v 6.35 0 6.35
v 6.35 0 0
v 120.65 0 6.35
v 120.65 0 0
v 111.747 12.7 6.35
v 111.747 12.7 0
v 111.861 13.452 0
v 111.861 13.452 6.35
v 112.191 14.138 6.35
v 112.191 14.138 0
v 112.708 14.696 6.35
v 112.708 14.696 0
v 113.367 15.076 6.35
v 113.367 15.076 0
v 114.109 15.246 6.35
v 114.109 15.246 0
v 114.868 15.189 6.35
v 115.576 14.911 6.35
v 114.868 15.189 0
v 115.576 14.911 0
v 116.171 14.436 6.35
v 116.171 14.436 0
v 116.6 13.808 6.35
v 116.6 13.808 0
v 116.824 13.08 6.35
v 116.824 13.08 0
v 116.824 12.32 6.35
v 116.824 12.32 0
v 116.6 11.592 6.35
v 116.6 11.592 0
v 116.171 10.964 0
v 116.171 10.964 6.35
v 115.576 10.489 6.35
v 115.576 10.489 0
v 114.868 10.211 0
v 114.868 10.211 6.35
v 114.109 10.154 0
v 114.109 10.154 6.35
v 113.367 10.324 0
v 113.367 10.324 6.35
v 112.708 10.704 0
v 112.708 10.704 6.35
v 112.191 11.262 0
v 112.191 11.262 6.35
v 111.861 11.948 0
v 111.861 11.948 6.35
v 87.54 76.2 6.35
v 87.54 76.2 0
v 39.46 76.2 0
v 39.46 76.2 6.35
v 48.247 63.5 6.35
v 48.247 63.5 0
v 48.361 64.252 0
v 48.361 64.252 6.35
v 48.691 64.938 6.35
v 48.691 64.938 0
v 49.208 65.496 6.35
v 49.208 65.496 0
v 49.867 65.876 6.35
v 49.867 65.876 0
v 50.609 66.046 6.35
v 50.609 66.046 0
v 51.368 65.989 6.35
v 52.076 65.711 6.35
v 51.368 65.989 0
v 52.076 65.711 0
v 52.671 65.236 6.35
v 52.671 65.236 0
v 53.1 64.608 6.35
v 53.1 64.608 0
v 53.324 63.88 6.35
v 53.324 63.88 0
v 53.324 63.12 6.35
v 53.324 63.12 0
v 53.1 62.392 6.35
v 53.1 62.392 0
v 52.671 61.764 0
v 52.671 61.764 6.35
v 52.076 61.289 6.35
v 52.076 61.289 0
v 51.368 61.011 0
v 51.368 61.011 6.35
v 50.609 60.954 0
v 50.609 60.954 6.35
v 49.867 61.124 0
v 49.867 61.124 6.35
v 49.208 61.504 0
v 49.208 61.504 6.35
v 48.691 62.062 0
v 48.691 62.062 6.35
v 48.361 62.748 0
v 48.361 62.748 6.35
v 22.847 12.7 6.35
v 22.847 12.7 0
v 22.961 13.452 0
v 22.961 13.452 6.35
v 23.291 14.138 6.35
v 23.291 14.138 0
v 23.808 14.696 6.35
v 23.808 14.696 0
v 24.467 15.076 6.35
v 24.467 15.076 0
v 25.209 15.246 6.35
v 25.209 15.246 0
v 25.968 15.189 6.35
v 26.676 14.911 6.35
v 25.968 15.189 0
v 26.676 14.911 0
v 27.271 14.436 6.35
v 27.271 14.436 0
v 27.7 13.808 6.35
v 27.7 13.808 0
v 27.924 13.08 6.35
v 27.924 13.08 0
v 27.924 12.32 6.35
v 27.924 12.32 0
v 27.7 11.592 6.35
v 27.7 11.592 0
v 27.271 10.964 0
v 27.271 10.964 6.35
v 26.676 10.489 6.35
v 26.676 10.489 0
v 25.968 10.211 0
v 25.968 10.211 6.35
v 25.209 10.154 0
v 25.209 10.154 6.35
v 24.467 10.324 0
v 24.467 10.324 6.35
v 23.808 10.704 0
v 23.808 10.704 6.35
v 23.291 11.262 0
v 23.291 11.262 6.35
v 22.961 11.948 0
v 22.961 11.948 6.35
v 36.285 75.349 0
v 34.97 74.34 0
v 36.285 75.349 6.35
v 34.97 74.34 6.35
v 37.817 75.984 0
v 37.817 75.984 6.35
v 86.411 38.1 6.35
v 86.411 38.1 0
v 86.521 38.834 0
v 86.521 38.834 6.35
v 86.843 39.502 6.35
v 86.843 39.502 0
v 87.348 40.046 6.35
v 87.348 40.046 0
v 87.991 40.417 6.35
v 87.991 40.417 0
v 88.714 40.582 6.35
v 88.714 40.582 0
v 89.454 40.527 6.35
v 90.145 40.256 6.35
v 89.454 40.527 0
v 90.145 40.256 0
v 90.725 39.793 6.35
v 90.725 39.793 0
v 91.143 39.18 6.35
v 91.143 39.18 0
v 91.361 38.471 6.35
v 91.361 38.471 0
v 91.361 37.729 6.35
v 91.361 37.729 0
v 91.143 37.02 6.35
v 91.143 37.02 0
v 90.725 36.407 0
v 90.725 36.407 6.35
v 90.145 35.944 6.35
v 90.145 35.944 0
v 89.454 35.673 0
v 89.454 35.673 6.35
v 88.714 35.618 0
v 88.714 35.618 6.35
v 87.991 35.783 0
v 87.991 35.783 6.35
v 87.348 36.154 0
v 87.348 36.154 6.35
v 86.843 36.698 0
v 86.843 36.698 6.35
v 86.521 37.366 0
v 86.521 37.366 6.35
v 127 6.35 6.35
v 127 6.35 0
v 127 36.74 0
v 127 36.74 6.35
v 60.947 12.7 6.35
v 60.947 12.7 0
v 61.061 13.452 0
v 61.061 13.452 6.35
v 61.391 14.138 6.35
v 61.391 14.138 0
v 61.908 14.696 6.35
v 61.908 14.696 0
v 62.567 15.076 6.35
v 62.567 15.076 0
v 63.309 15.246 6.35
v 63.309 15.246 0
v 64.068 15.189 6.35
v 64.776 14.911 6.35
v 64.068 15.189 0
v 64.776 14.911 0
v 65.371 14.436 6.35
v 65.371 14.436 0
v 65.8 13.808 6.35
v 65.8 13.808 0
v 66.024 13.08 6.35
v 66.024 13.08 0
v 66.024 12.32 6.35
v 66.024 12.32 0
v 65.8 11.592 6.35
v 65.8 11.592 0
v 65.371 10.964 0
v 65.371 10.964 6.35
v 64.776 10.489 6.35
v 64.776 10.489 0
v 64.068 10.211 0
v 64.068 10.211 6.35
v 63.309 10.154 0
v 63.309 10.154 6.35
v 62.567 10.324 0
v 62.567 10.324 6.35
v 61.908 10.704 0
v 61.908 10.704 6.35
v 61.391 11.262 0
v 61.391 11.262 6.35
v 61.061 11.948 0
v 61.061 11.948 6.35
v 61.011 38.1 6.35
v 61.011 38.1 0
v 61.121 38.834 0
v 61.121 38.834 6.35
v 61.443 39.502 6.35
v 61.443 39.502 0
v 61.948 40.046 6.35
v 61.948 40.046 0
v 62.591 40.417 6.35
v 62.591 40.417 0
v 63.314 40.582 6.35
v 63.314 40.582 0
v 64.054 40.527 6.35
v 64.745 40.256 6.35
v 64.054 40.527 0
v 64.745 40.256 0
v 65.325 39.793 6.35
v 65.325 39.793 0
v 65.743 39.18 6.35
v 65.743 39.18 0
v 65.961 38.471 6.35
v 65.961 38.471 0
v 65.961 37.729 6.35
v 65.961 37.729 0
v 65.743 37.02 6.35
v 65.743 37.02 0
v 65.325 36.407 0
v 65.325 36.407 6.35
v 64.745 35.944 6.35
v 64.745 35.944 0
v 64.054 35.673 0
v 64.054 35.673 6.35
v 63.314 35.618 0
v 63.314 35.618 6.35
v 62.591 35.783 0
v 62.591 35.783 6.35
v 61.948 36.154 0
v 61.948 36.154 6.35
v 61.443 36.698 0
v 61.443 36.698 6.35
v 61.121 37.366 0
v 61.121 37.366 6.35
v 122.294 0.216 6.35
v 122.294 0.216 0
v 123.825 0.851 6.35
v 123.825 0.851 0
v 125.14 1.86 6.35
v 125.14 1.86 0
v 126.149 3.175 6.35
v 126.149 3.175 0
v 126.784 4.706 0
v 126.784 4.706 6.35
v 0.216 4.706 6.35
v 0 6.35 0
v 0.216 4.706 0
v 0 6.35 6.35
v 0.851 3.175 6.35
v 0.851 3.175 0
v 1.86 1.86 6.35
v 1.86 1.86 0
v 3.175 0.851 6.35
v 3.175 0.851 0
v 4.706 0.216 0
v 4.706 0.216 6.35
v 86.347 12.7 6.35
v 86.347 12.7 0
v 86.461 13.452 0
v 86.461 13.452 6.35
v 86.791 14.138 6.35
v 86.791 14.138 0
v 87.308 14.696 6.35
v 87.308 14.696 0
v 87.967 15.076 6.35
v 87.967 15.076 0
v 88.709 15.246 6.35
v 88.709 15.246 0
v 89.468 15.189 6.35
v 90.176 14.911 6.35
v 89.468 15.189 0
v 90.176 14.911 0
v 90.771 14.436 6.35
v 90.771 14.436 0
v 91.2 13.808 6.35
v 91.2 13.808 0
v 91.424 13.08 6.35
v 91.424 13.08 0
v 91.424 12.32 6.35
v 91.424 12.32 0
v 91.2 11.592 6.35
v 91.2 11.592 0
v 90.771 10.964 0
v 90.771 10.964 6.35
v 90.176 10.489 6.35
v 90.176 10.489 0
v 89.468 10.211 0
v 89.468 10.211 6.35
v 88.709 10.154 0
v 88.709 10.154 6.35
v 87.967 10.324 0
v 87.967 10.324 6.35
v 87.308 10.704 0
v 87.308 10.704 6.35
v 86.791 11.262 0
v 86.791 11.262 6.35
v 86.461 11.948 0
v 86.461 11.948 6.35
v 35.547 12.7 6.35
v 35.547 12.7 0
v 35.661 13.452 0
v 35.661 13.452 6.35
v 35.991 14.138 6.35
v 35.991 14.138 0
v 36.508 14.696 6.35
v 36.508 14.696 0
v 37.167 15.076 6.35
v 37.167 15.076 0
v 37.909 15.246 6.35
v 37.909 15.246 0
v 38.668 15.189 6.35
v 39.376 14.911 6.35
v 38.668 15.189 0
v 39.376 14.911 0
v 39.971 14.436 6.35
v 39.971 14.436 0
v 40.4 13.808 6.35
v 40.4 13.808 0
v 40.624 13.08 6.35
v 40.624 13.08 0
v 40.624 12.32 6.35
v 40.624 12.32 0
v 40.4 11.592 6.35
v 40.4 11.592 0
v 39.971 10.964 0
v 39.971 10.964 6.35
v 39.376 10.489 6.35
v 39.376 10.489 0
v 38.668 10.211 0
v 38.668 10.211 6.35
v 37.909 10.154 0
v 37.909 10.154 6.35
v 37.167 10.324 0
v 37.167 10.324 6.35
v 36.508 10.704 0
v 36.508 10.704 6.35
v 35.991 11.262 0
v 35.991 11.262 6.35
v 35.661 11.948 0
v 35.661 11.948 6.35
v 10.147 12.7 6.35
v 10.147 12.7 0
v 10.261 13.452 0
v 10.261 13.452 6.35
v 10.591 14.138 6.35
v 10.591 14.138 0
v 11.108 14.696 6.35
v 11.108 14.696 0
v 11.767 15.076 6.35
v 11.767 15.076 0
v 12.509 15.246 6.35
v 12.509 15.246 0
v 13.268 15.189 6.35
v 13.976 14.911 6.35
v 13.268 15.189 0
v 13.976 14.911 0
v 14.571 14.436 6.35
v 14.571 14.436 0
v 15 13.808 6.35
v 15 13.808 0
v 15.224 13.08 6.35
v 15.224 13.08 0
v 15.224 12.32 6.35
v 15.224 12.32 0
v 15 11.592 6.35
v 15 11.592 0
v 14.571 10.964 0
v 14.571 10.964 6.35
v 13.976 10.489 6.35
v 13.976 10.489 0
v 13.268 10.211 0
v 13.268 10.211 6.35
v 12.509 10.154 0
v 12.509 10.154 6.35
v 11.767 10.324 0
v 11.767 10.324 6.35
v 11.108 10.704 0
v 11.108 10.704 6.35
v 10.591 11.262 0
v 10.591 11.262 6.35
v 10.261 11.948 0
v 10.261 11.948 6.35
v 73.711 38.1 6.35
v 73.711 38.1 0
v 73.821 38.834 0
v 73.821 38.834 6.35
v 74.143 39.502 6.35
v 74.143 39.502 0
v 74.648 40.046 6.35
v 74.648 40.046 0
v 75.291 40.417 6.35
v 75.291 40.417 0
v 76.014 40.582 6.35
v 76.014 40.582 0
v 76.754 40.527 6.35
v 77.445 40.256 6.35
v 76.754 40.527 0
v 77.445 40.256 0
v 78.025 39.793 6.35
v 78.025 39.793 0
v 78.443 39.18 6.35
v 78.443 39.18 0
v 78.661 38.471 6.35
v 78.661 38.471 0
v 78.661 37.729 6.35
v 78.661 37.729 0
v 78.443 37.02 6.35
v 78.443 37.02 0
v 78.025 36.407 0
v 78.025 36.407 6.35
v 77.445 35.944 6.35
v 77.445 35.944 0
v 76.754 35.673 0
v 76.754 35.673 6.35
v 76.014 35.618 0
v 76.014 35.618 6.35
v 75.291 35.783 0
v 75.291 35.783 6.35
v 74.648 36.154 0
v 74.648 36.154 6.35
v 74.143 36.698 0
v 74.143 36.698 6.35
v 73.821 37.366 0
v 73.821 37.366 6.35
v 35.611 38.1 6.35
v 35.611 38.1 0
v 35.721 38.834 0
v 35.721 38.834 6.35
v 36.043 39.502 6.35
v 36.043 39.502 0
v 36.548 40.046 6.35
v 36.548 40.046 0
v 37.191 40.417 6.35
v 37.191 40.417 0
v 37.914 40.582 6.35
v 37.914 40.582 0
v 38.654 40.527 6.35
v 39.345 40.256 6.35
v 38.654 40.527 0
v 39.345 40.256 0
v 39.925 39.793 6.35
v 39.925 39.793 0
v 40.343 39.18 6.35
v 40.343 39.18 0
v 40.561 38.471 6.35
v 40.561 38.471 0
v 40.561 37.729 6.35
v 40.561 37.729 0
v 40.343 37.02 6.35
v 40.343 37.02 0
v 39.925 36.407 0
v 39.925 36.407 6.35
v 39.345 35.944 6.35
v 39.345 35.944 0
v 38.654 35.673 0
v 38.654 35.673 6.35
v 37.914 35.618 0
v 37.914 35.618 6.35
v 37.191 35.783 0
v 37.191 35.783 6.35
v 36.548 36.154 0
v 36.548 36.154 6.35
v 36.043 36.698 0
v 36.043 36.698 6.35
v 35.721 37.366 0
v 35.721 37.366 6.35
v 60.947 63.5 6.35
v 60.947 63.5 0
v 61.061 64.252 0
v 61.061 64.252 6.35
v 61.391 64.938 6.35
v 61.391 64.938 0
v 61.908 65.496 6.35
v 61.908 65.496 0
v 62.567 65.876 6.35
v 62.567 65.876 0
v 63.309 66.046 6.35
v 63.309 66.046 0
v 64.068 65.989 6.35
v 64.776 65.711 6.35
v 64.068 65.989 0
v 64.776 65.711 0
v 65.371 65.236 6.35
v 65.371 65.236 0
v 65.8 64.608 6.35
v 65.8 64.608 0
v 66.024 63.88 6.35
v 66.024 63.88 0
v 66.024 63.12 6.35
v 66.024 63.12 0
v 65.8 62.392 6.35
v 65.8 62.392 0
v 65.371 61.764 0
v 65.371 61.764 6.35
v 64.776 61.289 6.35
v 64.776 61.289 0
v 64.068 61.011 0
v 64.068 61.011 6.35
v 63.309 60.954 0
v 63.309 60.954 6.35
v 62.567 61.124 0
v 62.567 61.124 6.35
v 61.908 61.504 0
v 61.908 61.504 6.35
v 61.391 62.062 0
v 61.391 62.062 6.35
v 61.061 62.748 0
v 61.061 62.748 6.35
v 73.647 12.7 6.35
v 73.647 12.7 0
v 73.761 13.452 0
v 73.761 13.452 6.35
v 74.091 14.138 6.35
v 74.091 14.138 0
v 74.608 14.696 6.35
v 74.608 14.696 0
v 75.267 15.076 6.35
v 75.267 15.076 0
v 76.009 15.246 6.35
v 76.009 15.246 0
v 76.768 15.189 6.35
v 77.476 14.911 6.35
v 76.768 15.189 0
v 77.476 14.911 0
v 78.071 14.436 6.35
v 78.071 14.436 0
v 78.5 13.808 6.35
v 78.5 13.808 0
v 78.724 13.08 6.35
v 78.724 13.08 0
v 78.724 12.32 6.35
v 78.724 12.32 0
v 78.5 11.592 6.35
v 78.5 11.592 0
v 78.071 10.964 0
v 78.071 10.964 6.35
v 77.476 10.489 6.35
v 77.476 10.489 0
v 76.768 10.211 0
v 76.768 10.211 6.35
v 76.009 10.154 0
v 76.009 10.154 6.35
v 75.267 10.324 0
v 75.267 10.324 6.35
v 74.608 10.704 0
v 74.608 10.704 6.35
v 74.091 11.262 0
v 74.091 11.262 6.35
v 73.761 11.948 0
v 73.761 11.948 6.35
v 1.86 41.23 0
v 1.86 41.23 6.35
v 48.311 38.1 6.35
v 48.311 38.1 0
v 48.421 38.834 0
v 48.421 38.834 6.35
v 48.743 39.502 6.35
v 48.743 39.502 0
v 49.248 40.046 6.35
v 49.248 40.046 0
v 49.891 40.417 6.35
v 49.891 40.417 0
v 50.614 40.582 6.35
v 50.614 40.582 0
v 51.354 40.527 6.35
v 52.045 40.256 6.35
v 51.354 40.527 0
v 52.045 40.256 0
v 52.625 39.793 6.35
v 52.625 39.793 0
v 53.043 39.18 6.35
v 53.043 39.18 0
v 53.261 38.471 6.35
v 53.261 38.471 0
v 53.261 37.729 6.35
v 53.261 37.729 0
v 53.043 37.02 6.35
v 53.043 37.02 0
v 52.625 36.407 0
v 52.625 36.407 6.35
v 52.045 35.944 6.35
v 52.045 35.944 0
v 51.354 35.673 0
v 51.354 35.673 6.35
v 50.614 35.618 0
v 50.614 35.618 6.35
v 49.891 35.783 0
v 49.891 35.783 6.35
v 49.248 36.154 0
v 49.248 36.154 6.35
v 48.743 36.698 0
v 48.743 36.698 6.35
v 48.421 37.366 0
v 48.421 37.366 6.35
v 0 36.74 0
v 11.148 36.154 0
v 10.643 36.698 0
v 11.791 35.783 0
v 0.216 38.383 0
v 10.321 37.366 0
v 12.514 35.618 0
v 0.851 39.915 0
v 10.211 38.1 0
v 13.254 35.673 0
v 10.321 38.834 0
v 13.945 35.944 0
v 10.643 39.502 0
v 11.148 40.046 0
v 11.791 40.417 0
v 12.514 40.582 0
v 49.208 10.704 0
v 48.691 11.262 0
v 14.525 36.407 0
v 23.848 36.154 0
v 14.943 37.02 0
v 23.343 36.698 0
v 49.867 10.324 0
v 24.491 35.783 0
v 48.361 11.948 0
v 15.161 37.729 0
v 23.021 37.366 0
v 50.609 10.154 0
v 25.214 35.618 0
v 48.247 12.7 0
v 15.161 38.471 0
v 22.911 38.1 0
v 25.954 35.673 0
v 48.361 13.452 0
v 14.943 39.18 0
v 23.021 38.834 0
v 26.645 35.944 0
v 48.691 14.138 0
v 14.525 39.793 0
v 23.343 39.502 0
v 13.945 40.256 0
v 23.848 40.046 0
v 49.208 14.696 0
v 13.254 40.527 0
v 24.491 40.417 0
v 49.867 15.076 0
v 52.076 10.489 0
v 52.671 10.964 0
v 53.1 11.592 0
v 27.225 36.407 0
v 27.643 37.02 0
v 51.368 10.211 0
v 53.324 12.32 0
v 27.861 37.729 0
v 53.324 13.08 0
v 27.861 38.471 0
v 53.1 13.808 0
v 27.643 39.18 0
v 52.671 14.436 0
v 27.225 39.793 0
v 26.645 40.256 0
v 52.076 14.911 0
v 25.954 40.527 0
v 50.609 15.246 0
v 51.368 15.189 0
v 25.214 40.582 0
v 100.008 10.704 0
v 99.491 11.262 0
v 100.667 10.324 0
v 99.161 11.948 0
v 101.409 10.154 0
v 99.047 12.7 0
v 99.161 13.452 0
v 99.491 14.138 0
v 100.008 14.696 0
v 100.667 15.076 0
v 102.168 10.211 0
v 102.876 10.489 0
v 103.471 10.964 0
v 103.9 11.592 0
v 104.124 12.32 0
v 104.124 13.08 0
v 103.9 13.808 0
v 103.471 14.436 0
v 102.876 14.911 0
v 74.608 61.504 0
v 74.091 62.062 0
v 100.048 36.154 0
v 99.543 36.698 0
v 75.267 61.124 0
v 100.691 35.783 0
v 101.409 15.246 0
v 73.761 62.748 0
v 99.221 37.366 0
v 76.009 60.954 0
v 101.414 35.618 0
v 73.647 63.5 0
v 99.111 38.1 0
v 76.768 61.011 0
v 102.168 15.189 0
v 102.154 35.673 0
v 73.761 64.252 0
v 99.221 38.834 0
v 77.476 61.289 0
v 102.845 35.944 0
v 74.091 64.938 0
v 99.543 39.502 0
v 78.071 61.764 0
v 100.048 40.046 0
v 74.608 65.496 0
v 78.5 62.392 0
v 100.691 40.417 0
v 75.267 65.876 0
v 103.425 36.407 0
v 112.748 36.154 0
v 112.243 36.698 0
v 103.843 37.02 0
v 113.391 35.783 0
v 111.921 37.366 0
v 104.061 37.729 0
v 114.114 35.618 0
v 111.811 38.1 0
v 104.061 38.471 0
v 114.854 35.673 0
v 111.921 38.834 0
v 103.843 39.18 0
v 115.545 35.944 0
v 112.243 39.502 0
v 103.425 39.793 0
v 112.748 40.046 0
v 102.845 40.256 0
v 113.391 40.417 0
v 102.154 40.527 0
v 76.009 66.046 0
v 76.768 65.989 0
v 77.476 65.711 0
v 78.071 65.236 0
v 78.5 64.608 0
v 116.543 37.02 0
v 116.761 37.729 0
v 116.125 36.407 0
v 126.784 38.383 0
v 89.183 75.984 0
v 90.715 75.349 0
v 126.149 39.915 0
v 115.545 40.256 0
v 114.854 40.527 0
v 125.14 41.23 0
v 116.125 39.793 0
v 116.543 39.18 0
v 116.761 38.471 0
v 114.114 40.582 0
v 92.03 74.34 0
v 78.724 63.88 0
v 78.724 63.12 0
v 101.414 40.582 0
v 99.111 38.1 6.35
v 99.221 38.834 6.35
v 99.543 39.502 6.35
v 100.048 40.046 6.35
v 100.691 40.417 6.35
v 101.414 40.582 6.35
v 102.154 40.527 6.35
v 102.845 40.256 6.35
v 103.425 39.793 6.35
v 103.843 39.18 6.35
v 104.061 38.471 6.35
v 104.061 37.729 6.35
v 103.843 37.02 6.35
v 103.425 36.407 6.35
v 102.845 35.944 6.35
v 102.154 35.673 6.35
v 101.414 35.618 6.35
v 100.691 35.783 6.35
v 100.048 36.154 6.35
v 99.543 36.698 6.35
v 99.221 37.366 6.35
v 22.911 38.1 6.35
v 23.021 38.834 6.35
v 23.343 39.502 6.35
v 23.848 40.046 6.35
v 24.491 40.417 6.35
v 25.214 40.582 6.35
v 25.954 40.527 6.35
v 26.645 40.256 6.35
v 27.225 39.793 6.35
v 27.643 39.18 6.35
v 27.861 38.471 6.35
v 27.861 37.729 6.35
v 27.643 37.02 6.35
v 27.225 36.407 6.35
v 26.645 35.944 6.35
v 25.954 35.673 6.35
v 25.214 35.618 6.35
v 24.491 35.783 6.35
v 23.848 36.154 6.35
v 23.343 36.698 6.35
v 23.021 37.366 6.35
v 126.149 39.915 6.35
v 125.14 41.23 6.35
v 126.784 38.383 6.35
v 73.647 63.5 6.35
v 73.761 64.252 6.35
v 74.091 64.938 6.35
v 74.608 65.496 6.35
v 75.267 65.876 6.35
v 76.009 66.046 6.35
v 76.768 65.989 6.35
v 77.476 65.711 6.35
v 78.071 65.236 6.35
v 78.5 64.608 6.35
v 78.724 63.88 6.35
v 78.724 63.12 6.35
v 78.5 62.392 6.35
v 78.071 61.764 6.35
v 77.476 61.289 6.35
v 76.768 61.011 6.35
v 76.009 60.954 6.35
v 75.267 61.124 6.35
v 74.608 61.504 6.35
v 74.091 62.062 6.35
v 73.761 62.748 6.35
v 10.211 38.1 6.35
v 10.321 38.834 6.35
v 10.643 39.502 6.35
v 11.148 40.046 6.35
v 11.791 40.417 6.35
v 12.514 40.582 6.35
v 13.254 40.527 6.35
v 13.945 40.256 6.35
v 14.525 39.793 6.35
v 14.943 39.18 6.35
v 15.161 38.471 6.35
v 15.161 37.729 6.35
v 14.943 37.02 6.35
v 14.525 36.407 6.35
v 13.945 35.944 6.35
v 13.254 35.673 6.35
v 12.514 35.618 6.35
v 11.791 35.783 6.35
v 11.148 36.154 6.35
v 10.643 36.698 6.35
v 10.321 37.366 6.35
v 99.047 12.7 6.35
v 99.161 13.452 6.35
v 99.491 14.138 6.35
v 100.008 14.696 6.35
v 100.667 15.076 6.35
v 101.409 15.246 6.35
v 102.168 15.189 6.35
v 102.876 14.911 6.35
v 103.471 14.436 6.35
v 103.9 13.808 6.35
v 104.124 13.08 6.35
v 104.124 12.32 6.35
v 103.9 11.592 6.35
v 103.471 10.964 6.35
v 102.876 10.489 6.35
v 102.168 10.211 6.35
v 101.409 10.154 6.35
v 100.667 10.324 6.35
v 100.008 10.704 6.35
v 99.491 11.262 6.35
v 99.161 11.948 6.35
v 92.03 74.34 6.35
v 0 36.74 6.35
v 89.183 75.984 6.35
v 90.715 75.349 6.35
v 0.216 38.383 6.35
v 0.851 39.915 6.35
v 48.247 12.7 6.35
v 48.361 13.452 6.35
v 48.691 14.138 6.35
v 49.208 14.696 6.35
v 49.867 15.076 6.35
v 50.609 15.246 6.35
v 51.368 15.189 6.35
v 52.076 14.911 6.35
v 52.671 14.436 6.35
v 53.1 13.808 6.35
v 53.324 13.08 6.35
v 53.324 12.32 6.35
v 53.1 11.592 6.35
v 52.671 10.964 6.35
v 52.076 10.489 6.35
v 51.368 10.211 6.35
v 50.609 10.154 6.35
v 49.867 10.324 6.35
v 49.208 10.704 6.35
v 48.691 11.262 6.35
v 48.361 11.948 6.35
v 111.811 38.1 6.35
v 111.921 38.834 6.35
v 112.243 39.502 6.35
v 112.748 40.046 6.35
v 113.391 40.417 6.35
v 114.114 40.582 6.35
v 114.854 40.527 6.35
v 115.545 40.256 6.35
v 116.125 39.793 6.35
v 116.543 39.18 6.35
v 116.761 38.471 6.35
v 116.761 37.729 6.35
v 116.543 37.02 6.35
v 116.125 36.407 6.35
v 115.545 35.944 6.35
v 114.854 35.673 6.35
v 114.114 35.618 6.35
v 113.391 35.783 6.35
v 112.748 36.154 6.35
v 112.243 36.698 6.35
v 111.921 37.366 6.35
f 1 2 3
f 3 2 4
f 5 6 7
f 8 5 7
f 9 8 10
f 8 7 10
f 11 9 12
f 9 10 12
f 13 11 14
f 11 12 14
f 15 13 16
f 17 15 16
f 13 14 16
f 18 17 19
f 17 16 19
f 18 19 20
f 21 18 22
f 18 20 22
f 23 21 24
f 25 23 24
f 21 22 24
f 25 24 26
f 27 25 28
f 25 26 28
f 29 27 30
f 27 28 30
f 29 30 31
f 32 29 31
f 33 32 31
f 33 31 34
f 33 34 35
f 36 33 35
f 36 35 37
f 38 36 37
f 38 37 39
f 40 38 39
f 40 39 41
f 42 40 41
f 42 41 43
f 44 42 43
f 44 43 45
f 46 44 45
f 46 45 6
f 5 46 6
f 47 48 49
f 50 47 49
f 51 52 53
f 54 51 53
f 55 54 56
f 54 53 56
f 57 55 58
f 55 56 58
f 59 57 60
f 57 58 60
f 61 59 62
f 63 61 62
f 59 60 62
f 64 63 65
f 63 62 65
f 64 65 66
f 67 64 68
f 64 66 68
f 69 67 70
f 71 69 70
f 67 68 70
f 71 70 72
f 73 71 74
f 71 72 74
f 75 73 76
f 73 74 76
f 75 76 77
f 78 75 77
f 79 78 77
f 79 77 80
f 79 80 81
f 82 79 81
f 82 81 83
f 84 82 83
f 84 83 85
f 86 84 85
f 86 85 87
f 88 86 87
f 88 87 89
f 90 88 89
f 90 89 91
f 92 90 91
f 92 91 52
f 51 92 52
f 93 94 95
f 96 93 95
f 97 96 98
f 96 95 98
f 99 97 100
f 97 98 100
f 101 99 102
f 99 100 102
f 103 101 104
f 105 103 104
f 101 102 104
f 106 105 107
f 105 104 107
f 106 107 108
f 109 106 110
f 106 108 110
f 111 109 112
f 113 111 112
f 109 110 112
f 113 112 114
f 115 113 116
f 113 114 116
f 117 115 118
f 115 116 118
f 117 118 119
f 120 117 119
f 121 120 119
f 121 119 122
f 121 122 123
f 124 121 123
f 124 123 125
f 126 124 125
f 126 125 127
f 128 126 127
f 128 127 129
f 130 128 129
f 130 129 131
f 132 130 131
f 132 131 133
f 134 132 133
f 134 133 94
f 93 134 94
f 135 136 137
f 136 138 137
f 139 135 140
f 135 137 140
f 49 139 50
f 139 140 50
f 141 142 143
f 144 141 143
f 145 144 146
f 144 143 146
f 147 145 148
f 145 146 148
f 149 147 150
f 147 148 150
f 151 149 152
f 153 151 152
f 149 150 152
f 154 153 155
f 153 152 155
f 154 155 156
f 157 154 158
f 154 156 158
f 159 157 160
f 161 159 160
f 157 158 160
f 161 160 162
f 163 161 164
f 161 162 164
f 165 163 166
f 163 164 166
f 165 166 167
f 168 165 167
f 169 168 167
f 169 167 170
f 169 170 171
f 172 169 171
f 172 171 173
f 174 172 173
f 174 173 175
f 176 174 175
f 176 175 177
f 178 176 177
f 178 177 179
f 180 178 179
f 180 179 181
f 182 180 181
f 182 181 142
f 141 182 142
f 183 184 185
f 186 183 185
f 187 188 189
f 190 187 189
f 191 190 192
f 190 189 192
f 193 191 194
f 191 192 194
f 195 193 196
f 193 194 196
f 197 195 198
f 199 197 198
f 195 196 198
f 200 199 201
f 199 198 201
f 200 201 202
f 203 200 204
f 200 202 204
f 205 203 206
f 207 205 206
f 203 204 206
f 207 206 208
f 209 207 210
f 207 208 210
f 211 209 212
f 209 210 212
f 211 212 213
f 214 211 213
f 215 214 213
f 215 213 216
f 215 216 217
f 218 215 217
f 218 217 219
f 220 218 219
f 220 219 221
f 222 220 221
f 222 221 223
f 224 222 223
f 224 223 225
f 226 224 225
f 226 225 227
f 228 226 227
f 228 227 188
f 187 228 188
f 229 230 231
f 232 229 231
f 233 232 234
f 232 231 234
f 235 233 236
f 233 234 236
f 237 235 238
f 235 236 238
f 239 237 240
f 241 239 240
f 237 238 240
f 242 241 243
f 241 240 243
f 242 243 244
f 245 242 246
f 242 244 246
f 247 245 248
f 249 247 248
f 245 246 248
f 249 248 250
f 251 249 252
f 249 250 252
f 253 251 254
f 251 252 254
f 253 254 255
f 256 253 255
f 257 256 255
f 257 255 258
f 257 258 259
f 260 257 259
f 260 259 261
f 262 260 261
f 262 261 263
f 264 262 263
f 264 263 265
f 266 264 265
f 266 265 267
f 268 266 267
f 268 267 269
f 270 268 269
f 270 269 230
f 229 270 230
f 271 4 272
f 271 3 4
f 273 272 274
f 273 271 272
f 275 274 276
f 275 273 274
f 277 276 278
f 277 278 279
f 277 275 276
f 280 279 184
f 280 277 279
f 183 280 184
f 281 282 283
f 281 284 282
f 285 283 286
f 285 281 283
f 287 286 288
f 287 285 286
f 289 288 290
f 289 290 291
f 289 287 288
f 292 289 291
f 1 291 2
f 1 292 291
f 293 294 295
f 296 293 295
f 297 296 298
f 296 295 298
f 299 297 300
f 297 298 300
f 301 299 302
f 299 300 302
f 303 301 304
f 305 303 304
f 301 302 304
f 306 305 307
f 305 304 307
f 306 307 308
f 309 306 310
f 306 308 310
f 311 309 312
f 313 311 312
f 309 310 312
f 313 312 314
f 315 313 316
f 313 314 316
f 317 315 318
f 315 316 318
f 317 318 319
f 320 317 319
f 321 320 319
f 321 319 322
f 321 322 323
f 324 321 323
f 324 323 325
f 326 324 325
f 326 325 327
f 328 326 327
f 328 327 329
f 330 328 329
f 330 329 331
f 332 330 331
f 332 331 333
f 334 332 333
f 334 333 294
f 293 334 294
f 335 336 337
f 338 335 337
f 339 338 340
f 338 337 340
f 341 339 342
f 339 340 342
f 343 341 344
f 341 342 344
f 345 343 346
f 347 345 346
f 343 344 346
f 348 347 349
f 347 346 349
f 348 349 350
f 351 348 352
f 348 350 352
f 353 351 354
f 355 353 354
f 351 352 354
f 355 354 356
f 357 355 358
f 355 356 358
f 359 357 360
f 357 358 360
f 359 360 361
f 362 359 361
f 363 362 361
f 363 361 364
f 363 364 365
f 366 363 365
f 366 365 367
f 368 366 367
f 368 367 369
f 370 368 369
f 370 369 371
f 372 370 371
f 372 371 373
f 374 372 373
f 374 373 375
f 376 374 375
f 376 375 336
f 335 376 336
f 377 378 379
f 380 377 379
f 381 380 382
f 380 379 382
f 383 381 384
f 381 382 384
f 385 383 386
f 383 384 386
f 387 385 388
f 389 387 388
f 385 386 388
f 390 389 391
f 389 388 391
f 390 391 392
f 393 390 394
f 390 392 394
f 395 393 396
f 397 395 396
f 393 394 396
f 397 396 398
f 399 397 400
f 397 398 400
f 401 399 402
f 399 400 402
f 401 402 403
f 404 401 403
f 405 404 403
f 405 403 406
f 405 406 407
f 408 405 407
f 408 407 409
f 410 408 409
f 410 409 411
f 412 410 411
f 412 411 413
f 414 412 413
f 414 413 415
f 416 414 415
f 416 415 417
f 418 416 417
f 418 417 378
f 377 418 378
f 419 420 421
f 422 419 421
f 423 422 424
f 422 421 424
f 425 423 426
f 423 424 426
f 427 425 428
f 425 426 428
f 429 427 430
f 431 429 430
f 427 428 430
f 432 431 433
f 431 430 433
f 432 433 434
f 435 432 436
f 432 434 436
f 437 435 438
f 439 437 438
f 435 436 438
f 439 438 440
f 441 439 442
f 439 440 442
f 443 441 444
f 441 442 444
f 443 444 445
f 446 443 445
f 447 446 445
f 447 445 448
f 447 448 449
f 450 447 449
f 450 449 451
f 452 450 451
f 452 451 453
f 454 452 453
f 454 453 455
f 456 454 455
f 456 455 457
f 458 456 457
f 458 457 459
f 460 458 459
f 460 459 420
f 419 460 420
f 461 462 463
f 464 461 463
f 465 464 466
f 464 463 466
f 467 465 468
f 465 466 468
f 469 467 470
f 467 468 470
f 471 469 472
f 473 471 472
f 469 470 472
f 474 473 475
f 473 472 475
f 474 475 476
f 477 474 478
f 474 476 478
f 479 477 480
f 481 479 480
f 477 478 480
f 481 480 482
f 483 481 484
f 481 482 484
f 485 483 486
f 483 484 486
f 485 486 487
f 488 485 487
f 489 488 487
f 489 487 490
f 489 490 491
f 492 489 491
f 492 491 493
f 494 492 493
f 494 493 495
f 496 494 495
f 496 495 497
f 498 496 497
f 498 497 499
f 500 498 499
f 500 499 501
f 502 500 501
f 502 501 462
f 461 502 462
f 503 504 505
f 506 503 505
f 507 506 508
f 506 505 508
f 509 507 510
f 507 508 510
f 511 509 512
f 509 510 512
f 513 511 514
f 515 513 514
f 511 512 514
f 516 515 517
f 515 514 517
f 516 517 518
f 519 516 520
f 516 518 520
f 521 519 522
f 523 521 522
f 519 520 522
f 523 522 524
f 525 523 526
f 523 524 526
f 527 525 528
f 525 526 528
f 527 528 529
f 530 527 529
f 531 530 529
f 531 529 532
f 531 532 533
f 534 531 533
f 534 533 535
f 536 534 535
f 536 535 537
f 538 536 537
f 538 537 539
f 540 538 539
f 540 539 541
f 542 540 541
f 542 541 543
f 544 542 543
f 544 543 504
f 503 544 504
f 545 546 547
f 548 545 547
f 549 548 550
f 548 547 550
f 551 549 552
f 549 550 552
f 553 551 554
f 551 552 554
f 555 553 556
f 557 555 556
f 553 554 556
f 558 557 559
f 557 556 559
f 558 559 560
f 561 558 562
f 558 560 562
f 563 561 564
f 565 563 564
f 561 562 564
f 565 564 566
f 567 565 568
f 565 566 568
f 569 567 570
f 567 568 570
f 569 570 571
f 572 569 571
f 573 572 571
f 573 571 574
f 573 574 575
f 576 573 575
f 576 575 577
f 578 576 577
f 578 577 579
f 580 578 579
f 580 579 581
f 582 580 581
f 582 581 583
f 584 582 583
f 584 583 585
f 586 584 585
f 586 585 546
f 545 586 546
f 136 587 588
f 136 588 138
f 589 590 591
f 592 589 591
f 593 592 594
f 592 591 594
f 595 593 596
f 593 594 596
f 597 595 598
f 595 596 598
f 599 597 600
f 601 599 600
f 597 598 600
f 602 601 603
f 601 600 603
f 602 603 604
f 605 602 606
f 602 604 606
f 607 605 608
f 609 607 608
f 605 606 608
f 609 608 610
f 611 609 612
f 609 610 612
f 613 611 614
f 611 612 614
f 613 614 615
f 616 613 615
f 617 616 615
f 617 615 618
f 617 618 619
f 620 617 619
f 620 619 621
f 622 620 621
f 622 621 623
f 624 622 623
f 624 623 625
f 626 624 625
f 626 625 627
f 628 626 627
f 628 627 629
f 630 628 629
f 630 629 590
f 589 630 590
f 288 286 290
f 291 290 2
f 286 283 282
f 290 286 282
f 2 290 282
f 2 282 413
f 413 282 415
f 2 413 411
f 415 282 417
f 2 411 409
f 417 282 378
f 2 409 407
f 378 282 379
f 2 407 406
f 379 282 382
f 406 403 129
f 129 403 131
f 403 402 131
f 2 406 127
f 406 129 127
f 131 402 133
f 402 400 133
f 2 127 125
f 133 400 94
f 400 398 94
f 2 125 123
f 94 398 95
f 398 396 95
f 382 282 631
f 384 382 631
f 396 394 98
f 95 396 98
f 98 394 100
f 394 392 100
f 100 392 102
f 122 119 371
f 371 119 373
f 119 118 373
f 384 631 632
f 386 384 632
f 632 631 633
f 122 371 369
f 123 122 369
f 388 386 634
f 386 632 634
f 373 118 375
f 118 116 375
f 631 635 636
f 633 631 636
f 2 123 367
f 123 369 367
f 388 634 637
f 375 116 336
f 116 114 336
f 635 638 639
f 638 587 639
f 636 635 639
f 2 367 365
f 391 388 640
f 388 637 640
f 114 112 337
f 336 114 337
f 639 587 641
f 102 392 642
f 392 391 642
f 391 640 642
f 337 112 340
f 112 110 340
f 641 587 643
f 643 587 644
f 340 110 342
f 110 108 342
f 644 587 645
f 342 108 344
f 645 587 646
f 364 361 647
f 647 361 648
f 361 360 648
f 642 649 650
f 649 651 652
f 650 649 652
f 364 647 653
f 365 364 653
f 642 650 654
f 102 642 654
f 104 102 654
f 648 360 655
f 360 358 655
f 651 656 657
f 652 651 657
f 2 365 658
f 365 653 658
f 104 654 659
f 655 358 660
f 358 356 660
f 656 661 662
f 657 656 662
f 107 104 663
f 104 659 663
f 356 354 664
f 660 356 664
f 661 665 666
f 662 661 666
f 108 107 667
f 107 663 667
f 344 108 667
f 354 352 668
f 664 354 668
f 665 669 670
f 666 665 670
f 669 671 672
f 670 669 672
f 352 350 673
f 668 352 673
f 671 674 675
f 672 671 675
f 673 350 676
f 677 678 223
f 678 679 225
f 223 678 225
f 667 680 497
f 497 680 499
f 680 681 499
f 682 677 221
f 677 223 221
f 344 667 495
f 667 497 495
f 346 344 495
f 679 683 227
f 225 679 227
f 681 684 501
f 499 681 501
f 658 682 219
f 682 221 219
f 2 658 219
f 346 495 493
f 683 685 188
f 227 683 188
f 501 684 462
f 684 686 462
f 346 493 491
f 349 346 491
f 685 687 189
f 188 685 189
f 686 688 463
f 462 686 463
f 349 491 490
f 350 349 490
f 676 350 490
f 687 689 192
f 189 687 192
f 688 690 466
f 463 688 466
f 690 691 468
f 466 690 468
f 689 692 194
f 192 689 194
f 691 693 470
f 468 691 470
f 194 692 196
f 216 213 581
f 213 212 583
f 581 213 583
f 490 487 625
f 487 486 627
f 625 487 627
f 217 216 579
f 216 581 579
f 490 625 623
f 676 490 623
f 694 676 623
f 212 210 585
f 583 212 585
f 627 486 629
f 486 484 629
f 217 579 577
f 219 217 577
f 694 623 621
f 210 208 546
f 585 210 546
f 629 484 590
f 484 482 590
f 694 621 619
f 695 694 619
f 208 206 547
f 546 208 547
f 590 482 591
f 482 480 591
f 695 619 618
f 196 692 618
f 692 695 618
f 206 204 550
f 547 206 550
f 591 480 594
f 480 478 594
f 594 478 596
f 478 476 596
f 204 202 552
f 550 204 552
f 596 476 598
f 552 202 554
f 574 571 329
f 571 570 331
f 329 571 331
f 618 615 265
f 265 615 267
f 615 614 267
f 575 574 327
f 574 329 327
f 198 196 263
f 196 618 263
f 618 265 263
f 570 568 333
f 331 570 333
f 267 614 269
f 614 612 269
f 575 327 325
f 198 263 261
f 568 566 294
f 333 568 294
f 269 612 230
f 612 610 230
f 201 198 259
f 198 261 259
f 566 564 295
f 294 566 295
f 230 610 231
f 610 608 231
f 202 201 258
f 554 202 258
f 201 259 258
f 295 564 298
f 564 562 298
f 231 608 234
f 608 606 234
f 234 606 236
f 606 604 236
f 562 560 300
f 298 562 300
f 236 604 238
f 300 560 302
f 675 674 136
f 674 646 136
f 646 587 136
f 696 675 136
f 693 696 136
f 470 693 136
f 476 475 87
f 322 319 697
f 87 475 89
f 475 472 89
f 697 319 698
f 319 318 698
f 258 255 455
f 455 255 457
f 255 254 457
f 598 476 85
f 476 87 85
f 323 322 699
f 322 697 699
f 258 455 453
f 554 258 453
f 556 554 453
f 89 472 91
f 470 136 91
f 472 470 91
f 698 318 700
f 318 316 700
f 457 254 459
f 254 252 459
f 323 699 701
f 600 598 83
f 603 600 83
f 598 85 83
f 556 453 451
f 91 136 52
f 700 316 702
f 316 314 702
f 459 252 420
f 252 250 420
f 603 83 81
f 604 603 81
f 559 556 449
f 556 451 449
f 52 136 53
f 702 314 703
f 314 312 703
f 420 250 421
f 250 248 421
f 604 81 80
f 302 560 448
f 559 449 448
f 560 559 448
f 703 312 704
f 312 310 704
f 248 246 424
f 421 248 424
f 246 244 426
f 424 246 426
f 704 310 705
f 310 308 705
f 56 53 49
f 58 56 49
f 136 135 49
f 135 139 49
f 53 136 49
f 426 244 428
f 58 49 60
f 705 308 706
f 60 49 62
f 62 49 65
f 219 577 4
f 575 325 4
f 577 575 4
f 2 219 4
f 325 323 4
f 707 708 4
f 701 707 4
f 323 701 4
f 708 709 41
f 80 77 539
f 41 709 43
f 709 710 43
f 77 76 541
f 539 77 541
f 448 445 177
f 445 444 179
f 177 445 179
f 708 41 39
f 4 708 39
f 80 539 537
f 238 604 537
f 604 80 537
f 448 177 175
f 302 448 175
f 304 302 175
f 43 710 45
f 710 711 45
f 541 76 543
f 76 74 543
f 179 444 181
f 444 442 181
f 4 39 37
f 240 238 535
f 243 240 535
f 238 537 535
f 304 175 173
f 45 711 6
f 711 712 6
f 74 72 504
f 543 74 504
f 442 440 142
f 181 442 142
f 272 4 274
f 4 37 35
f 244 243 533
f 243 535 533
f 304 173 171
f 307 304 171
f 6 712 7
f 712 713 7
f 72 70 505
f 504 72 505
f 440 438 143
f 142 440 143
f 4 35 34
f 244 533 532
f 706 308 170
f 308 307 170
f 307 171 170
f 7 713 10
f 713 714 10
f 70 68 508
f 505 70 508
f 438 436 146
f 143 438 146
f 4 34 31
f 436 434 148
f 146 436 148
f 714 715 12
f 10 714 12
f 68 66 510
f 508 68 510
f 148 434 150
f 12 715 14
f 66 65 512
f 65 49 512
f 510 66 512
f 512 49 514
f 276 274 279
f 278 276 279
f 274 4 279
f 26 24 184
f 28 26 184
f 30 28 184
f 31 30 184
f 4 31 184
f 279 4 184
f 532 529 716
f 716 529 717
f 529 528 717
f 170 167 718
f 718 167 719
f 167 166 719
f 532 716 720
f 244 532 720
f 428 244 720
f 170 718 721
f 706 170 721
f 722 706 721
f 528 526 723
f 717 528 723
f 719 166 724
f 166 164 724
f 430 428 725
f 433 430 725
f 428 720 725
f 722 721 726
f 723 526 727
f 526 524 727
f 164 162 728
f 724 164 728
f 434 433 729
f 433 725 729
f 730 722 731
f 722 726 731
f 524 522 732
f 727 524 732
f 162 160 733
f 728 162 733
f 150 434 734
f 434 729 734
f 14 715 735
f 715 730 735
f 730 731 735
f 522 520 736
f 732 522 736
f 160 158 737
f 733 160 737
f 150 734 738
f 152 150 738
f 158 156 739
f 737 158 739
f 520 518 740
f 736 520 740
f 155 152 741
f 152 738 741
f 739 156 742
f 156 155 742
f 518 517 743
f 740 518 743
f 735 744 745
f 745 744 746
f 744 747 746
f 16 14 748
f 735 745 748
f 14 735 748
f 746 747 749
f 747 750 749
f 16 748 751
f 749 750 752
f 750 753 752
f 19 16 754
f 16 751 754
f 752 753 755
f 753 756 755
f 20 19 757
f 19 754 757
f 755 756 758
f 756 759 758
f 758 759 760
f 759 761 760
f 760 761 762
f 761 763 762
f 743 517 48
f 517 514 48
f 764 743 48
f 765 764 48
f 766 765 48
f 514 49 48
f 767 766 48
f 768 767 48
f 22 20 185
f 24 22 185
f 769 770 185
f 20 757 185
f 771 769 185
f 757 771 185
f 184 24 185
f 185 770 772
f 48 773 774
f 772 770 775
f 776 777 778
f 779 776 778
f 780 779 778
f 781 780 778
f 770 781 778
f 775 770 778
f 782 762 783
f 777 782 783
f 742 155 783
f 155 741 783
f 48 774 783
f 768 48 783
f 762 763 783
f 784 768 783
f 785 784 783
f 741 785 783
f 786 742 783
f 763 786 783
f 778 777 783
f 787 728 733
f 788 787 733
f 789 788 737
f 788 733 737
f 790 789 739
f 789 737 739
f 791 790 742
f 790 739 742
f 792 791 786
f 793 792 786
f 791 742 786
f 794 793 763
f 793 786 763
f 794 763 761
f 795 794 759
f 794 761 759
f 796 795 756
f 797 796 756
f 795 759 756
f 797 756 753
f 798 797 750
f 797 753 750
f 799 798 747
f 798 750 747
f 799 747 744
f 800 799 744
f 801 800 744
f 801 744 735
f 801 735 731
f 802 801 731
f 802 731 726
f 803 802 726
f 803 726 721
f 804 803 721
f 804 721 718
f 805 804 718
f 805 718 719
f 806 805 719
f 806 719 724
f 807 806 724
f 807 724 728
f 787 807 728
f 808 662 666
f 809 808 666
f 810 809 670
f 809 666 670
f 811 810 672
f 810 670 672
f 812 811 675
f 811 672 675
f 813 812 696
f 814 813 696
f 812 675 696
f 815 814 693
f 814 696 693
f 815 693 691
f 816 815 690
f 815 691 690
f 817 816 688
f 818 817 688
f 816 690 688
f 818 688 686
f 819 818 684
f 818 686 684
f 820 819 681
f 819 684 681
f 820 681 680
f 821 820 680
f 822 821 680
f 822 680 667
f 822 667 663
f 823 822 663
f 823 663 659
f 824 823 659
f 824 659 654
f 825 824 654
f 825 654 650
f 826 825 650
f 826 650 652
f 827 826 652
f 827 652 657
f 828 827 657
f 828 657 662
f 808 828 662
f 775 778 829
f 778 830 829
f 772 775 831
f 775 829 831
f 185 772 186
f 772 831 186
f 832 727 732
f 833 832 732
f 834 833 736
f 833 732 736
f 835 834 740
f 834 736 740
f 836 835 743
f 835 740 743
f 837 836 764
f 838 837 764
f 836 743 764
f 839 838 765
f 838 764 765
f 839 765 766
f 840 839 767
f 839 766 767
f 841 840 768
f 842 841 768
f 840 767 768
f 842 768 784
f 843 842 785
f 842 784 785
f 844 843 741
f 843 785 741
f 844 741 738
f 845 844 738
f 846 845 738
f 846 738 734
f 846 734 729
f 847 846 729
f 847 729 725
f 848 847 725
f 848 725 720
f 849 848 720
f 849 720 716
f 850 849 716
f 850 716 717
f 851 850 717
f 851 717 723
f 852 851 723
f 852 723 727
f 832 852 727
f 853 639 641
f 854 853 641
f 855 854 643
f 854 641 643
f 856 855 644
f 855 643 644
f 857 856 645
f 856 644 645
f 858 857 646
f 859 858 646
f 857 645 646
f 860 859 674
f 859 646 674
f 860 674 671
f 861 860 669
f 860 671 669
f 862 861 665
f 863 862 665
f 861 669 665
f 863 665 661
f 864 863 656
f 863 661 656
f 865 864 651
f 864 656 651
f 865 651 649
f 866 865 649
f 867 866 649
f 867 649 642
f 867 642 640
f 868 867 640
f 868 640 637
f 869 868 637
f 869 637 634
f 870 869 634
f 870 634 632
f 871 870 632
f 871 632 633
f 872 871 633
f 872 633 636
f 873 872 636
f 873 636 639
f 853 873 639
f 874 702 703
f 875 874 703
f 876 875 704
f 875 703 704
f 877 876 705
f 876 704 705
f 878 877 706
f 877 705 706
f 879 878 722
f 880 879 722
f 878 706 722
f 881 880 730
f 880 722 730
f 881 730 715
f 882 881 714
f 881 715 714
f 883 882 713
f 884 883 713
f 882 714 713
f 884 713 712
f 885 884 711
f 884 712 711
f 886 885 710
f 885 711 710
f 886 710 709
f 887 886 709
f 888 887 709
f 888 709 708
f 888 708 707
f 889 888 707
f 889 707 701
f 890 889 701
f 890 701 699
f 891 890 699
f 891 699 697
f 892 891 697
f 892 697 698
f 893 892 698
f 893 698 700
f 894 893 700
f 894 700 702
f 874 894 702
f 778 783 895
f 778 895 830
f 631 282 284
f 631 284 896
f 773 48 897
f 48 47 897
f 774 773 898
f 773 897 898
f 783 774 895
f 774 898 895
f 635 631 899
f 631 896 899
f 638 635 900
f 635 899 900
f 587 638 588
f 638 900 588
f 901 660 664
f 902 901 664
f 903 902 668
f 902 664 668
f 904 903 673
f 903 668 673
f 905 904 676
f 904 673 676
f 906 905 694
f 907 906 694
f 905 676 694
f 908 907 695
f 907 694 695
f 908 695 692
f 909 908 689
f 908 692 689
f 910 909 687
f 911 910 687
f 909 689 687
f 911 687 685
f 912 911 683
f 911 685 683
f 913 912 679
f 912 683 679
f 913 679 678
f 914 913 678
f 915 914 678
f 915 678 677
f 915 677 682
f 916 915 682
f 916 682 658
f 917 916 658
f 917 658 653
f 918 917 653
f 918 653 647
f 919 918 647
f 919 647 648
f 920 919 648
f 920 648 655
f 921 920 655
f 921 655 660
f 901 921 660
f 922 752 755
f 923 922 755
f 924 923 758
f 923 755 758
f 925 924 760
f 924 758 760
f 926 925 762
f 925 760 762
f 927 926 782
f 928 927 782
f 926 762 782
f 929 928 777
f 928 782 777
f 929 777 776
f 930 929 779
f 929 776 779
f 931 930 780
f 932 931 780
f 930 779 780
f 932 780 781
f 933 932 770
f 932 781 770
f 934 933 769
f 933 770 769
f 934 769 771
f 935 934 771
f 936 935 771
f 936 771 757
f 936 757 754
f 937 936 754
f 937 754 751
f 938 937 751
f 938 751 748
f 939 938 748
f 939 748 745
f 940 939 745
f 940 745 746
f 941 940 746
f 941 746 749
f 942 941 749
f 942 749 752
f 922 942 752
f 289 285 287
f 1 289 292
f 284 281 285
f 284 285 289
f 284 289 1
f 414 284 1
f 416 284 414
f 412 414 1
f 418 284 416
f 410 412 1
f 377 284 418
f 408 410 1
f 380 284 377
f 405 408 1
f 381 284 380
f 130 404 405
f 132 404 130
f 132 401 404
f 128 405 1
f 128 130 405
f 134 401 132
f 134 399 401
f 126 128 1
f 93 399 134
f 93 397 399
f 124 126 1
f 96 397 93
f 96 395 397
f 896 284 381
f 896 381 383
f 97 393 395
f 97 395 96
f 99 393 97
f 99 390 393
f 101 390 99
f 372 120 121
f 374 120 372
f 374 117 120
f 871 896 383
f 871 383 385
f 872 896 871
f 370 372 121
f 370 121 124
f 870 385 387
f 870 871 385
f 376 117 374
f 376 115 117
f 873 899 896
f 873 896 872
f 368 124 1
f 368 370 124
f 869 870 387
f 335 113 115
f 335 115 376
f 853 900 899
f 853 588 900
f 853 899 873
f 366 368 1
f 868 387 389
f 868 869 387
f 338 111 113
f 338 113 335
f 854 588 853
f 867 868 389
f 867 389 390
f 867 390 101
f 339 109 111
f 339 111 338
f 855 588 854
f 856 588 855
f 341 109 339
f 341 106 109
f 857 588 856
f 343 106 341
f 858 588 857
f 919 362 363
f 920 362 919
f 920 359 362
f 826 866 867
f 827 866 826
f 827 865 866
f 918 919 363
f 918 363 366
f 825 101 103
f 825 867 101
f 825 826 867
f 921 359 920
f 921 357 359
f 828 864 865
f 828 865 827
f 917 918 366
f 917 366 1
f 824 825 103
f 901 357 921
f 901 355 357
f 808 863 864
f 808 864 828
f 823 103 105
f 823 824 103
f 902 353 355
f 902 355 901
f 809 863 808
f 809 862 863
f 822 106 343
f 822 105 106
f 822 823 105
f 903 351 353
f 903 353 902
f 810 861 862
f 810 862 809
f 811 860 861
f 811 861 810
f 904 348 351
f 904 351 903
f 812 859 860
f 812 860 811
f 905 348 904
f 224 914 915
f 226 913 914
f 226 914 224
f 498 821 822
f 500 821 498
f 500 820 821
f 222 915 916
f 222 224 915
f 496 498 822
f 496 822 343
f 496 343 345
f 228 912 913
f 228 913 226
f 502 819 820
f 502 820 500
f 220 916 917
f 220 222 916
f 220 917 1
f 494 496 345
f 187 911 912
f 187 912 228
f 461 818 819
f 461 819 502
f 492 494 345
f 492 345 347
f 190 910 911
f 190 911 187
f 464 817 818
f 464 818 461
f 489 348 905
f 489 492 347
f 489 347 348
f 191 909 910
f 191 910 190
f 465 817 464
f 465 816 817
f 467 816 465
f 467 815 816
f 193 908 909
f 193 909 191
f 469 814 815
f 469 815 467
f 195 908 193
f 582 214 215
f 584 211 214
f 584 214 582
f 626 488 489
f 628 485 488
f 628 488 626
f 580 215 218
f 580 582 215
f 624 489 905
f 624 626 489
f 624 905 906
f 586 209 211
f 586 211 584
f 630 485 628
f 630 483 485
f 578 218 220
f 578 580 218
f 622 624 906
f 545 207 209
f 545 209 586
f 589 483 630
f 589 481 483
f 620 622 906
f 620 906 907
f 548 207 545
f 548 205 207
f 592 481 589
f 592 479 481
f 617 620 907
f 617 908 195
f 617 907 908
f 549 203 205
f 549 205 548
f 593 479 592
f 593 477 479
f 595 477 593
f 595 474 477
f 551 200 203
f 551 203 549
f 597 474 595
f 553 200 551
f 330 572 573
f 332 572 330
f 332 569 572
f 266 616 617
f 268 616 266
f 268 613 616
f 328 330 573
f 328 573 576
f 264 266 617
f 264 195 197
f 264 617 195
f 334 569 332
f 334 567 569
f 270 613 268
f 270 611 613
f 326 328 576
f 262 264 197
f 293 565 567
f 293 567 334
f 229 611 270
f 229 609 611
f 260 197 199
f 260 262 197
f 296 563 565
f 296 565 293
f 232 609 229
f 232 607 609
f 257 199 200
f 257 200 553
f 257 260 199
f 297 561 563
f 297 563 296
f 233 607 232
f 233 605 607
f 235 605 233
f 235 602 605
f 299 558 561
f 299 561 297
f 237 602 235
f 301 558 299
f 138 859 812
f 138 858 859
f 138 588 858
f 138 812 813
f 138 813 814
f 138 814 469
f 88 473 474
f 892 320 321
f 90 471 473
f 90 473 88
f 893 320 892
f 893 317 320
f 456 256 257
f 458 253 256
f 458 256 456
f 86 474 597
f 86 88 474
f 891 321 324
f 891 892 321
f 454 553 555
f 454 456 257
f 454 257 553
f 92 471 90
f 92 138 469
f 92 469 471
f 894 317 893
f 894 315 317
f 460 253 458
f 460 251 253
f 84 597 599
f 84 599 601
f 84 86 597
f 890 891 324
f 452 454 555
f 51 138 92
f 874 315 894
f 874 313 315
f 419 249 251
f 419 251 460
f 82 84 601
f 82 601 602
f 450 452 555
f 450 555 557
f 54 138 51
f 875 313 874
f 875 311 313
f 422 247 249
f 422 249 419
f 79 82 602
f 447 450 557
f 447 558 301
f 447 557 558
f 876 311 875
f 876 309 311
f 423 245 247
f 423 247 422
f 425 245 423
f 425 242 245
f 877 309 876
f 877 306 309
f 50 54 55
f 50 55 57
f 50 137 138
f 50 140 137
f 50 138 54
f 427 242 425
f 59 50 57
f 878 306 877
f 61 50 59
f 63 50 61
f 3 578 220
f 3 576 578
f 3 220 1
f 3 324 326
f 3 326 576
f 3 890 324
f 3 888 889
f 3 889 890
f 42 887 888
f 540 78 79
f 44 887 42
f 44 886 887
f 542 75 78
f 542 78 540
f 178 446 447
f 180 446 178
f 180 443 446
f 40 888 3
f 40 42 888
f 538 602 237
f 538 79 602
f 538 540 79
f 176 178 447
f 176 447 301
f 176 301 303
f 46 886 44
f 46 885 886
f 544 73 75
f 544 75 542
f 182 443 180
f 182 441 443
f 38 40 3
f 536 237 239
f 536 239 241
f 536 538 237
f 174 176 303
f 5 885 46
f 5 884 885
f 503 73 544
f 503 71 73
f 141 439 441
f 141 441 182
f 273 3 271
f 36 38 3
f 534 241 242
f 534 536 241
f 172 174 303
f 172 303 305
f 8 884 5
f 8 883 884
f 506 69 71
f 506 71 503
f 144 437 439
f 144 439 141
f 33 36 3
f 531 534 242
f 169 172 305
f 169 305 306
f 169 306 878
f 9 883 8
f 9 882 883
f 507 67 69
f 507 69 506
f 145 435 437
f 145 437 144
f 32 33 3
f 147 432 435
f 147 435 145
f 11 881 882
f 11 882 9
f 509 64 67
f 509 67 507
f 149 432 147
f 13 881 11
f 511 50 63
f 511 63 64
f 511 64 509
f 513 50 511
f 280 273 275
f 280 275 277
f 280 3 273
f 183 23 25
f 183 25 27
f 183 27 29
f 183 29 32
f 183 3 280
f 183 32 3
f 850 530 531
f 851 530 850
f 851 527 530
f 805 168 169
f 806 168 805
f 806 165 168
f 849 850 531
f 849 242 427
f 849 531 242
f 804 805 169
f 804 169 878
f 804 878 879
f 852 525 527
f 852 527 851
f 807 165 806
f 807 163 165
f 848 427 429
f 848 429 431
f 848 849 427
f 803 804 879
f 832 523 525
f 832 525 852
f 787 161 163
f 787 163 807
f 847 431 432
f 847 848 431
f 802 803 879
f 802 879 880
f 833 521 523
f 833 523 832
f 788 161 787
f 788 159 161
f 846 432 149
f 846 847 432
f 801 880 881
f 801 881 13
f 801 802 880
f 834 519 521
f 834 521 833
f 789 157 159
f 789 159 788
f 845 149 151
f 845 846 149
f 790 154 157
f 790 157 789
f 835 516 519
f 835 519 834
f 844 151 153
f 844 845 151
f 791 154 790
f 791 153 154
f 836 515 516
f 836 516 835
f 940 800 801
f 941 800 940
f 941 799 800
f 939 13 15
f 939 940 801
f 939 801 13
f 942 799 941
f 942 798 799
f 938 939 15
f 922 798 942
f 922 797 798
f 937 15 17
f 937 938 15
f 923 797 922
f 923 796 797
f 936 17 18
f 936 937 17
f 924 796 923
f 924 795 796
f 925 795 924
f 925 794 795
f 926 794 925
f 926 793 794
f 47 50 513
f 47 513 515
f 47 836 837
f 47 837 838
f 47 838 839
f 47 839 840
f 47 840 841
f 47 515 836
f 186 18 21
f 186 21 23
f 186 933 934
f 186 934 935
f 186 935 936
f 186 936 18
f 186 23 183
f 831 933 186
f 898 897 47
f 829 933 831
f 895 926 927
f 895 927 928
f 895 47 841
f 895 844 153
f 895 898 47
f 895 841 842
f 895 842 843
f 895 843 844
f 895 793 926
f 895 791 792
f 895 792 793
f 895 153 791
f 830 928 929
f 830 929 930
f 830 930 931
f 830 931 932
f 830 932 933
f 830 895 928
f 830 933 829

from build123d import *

# Parameters (mm, degrees)
SKETCH1_W               = 127
SKETCH1_H               = 82.55
BOSS_EXTRUDE1_DEPTH     = 6.35
SKETCH2_R               = 2.5527
CUT_EXTRUDE1_DEPTH      = 1
CUT_EXTRUDE1_DEPTH_BACK = 7.35
SKETCH3_R               = 2.4892
SKETCH3_R_2             = 2.5527
CUT_EXTRUDE2_DEPTH      = 7.35
CUT_EXTRUDE3_DEPTH      = 7.35
CUT_EXTRUDE4_DEPTH      = 7.35
FILLET1_R               = 6.35


with BuildPart() as part:
    # Sketch1 → Boss-Extrude1 (new body)
    with BuildSketch(Plane.XY):
        with Locations((63.5, 41.275)):
            Rectangle(SKETCH1_W, SKETCH1_H)
    extrude(amount=BOSS_EXTRUDE1_DEPTH)

    # Sketch2 → Cut-Extrude1 (cut, two sides)
    with BuildSketch(Plane(origin=(0, 0, 0), x_dir=(-1, 0, 0), z_dir=(0, 0, -1))) as cut_extrude1_sk:
        with Locations((-76.2, 63.5)):
            Circle(SKETCH2_R)
        with Locations((-63.5, 63.5)):
            Circle(SKETCH2_R)
        with Locations((-50.8, 63.5)):
            Circle(SKETCH2_R)
    extrude(amount=CUT_EXTRUDE1_DEPTH, mode=Mode.SUBTRACT)
    extrude(cut_extrude1_sk.sketch, amount=-CUT_EXTRUDE1_DEPTH_BACK, mode=Mode.SUBTRACT)

    # Sketch3 → Cut-Extrude2 (cut, through all)
    with BuildSketch(Plane(origin=(0, 0, 0), x_dir=(-1, 0, 0), z_dir=(0, 0, -1))):
        with Locations((-114.3, 38.1)):
            Circle(SKETCH3_R)
        with Locations((-114.3, 12.7)):
            Circle(SKETCH3_R_2)
        with Locations((-101.6, 38.1)):
            Circle(SKETCH3_R)
        with Locations((-101.6, 12.7)):
            Circle(SKETCH3_R_2)
        with Locations((-88.9, 38.1)):
            Circle(SKETCH3_R)
        with Locations((-88.9, 12.7)):
            Circle(SKETCH3_R_2)
        with Locations((-76.2, 38.1)):
            Circle(SKETCH3_R)
        with Locations((-76.2, 12.7)):
            Circle(SKETCH3_R_2)
        with Locations((-63.5, 38.1)):
            Circle(SKETCH3_R)
        with Locations((-63.5, 12.7)):
            Circle(SKETCH3_R_2)
        with Locations((-50.8, 38.1)):
            Circle(SKETCH3_R)
        with Locations((-50.8, 12.7)):
            Circle(SKETCH3_R_2)
        with Locations((-38.1, 38.1)):
            Circle(SKETCH3_R)
        with Locations((-38.1, 12.7)):
            Circle(SKETCH3_R_2)
        with Locations((-25.4, 38.1)):
            Circle(SKETCH3_R)
        with Locations((-25.4, 12.7)):
            Circle(SKETCH3_R_2)
        with Locations((-12.7, 38.1)):
            Circle(SKETCH3_R)
        with Locations((-12.7, 12.7)):
            Circle(SKETCH3_R_2)
    extrude(amount=-CUT_EXTRUDE2_DEPTH, mode=Mode.SUBTRACT)

    # Sketch4 → Cut-Extrude3 (cut, through all)
    with BuildSketch(Plane(origin=(0, 0, 0), x_dir=(-1, 0, 0), z_dir=(0, 0, -1))):
        Polygon((-83.82, 82.55), (-127, 39.37), (-127, 82.55), align=None)
        Polygon((-43.18, 82.55), (0, 82.55), (0, 39.37), align=None)
    extrude(amount=-CUT_EXTRUDE3_DEPTH, mode=Mode.SUBTRACT)

    # Sketch5 → Cut-Extrude4 (cut, through all)
    with BuildSketch(Plane(origin=(0, 0, 0), x_dir=(-1, 0, 0), z_dir=(0, 0, -1))):
        Polygon((-90.17, 76.2), (-36.83, 76.2), (-43.18, 82.55), (-83.82, 82.55), align=None)
    extrude(amount=-CUT_EXTRUDE4_DEPTH, mode=Mode.SUBTRACT)

    # Fillet1
    fillet1_edges = [part.edges().sort_by_distance(p)[0] for p in [
        (127, 39.37, 3.175),
        (0, 39.37, 3.175),
        (90.17, 76.2, 3.175),
        (36.83, 76.2, 3.175),
        (127, 0, 3.175),
        (0, 0, 3.175),
    ]]
    fillet(fillet1_edges, radius=FILLET1_R)


solid = part.part
